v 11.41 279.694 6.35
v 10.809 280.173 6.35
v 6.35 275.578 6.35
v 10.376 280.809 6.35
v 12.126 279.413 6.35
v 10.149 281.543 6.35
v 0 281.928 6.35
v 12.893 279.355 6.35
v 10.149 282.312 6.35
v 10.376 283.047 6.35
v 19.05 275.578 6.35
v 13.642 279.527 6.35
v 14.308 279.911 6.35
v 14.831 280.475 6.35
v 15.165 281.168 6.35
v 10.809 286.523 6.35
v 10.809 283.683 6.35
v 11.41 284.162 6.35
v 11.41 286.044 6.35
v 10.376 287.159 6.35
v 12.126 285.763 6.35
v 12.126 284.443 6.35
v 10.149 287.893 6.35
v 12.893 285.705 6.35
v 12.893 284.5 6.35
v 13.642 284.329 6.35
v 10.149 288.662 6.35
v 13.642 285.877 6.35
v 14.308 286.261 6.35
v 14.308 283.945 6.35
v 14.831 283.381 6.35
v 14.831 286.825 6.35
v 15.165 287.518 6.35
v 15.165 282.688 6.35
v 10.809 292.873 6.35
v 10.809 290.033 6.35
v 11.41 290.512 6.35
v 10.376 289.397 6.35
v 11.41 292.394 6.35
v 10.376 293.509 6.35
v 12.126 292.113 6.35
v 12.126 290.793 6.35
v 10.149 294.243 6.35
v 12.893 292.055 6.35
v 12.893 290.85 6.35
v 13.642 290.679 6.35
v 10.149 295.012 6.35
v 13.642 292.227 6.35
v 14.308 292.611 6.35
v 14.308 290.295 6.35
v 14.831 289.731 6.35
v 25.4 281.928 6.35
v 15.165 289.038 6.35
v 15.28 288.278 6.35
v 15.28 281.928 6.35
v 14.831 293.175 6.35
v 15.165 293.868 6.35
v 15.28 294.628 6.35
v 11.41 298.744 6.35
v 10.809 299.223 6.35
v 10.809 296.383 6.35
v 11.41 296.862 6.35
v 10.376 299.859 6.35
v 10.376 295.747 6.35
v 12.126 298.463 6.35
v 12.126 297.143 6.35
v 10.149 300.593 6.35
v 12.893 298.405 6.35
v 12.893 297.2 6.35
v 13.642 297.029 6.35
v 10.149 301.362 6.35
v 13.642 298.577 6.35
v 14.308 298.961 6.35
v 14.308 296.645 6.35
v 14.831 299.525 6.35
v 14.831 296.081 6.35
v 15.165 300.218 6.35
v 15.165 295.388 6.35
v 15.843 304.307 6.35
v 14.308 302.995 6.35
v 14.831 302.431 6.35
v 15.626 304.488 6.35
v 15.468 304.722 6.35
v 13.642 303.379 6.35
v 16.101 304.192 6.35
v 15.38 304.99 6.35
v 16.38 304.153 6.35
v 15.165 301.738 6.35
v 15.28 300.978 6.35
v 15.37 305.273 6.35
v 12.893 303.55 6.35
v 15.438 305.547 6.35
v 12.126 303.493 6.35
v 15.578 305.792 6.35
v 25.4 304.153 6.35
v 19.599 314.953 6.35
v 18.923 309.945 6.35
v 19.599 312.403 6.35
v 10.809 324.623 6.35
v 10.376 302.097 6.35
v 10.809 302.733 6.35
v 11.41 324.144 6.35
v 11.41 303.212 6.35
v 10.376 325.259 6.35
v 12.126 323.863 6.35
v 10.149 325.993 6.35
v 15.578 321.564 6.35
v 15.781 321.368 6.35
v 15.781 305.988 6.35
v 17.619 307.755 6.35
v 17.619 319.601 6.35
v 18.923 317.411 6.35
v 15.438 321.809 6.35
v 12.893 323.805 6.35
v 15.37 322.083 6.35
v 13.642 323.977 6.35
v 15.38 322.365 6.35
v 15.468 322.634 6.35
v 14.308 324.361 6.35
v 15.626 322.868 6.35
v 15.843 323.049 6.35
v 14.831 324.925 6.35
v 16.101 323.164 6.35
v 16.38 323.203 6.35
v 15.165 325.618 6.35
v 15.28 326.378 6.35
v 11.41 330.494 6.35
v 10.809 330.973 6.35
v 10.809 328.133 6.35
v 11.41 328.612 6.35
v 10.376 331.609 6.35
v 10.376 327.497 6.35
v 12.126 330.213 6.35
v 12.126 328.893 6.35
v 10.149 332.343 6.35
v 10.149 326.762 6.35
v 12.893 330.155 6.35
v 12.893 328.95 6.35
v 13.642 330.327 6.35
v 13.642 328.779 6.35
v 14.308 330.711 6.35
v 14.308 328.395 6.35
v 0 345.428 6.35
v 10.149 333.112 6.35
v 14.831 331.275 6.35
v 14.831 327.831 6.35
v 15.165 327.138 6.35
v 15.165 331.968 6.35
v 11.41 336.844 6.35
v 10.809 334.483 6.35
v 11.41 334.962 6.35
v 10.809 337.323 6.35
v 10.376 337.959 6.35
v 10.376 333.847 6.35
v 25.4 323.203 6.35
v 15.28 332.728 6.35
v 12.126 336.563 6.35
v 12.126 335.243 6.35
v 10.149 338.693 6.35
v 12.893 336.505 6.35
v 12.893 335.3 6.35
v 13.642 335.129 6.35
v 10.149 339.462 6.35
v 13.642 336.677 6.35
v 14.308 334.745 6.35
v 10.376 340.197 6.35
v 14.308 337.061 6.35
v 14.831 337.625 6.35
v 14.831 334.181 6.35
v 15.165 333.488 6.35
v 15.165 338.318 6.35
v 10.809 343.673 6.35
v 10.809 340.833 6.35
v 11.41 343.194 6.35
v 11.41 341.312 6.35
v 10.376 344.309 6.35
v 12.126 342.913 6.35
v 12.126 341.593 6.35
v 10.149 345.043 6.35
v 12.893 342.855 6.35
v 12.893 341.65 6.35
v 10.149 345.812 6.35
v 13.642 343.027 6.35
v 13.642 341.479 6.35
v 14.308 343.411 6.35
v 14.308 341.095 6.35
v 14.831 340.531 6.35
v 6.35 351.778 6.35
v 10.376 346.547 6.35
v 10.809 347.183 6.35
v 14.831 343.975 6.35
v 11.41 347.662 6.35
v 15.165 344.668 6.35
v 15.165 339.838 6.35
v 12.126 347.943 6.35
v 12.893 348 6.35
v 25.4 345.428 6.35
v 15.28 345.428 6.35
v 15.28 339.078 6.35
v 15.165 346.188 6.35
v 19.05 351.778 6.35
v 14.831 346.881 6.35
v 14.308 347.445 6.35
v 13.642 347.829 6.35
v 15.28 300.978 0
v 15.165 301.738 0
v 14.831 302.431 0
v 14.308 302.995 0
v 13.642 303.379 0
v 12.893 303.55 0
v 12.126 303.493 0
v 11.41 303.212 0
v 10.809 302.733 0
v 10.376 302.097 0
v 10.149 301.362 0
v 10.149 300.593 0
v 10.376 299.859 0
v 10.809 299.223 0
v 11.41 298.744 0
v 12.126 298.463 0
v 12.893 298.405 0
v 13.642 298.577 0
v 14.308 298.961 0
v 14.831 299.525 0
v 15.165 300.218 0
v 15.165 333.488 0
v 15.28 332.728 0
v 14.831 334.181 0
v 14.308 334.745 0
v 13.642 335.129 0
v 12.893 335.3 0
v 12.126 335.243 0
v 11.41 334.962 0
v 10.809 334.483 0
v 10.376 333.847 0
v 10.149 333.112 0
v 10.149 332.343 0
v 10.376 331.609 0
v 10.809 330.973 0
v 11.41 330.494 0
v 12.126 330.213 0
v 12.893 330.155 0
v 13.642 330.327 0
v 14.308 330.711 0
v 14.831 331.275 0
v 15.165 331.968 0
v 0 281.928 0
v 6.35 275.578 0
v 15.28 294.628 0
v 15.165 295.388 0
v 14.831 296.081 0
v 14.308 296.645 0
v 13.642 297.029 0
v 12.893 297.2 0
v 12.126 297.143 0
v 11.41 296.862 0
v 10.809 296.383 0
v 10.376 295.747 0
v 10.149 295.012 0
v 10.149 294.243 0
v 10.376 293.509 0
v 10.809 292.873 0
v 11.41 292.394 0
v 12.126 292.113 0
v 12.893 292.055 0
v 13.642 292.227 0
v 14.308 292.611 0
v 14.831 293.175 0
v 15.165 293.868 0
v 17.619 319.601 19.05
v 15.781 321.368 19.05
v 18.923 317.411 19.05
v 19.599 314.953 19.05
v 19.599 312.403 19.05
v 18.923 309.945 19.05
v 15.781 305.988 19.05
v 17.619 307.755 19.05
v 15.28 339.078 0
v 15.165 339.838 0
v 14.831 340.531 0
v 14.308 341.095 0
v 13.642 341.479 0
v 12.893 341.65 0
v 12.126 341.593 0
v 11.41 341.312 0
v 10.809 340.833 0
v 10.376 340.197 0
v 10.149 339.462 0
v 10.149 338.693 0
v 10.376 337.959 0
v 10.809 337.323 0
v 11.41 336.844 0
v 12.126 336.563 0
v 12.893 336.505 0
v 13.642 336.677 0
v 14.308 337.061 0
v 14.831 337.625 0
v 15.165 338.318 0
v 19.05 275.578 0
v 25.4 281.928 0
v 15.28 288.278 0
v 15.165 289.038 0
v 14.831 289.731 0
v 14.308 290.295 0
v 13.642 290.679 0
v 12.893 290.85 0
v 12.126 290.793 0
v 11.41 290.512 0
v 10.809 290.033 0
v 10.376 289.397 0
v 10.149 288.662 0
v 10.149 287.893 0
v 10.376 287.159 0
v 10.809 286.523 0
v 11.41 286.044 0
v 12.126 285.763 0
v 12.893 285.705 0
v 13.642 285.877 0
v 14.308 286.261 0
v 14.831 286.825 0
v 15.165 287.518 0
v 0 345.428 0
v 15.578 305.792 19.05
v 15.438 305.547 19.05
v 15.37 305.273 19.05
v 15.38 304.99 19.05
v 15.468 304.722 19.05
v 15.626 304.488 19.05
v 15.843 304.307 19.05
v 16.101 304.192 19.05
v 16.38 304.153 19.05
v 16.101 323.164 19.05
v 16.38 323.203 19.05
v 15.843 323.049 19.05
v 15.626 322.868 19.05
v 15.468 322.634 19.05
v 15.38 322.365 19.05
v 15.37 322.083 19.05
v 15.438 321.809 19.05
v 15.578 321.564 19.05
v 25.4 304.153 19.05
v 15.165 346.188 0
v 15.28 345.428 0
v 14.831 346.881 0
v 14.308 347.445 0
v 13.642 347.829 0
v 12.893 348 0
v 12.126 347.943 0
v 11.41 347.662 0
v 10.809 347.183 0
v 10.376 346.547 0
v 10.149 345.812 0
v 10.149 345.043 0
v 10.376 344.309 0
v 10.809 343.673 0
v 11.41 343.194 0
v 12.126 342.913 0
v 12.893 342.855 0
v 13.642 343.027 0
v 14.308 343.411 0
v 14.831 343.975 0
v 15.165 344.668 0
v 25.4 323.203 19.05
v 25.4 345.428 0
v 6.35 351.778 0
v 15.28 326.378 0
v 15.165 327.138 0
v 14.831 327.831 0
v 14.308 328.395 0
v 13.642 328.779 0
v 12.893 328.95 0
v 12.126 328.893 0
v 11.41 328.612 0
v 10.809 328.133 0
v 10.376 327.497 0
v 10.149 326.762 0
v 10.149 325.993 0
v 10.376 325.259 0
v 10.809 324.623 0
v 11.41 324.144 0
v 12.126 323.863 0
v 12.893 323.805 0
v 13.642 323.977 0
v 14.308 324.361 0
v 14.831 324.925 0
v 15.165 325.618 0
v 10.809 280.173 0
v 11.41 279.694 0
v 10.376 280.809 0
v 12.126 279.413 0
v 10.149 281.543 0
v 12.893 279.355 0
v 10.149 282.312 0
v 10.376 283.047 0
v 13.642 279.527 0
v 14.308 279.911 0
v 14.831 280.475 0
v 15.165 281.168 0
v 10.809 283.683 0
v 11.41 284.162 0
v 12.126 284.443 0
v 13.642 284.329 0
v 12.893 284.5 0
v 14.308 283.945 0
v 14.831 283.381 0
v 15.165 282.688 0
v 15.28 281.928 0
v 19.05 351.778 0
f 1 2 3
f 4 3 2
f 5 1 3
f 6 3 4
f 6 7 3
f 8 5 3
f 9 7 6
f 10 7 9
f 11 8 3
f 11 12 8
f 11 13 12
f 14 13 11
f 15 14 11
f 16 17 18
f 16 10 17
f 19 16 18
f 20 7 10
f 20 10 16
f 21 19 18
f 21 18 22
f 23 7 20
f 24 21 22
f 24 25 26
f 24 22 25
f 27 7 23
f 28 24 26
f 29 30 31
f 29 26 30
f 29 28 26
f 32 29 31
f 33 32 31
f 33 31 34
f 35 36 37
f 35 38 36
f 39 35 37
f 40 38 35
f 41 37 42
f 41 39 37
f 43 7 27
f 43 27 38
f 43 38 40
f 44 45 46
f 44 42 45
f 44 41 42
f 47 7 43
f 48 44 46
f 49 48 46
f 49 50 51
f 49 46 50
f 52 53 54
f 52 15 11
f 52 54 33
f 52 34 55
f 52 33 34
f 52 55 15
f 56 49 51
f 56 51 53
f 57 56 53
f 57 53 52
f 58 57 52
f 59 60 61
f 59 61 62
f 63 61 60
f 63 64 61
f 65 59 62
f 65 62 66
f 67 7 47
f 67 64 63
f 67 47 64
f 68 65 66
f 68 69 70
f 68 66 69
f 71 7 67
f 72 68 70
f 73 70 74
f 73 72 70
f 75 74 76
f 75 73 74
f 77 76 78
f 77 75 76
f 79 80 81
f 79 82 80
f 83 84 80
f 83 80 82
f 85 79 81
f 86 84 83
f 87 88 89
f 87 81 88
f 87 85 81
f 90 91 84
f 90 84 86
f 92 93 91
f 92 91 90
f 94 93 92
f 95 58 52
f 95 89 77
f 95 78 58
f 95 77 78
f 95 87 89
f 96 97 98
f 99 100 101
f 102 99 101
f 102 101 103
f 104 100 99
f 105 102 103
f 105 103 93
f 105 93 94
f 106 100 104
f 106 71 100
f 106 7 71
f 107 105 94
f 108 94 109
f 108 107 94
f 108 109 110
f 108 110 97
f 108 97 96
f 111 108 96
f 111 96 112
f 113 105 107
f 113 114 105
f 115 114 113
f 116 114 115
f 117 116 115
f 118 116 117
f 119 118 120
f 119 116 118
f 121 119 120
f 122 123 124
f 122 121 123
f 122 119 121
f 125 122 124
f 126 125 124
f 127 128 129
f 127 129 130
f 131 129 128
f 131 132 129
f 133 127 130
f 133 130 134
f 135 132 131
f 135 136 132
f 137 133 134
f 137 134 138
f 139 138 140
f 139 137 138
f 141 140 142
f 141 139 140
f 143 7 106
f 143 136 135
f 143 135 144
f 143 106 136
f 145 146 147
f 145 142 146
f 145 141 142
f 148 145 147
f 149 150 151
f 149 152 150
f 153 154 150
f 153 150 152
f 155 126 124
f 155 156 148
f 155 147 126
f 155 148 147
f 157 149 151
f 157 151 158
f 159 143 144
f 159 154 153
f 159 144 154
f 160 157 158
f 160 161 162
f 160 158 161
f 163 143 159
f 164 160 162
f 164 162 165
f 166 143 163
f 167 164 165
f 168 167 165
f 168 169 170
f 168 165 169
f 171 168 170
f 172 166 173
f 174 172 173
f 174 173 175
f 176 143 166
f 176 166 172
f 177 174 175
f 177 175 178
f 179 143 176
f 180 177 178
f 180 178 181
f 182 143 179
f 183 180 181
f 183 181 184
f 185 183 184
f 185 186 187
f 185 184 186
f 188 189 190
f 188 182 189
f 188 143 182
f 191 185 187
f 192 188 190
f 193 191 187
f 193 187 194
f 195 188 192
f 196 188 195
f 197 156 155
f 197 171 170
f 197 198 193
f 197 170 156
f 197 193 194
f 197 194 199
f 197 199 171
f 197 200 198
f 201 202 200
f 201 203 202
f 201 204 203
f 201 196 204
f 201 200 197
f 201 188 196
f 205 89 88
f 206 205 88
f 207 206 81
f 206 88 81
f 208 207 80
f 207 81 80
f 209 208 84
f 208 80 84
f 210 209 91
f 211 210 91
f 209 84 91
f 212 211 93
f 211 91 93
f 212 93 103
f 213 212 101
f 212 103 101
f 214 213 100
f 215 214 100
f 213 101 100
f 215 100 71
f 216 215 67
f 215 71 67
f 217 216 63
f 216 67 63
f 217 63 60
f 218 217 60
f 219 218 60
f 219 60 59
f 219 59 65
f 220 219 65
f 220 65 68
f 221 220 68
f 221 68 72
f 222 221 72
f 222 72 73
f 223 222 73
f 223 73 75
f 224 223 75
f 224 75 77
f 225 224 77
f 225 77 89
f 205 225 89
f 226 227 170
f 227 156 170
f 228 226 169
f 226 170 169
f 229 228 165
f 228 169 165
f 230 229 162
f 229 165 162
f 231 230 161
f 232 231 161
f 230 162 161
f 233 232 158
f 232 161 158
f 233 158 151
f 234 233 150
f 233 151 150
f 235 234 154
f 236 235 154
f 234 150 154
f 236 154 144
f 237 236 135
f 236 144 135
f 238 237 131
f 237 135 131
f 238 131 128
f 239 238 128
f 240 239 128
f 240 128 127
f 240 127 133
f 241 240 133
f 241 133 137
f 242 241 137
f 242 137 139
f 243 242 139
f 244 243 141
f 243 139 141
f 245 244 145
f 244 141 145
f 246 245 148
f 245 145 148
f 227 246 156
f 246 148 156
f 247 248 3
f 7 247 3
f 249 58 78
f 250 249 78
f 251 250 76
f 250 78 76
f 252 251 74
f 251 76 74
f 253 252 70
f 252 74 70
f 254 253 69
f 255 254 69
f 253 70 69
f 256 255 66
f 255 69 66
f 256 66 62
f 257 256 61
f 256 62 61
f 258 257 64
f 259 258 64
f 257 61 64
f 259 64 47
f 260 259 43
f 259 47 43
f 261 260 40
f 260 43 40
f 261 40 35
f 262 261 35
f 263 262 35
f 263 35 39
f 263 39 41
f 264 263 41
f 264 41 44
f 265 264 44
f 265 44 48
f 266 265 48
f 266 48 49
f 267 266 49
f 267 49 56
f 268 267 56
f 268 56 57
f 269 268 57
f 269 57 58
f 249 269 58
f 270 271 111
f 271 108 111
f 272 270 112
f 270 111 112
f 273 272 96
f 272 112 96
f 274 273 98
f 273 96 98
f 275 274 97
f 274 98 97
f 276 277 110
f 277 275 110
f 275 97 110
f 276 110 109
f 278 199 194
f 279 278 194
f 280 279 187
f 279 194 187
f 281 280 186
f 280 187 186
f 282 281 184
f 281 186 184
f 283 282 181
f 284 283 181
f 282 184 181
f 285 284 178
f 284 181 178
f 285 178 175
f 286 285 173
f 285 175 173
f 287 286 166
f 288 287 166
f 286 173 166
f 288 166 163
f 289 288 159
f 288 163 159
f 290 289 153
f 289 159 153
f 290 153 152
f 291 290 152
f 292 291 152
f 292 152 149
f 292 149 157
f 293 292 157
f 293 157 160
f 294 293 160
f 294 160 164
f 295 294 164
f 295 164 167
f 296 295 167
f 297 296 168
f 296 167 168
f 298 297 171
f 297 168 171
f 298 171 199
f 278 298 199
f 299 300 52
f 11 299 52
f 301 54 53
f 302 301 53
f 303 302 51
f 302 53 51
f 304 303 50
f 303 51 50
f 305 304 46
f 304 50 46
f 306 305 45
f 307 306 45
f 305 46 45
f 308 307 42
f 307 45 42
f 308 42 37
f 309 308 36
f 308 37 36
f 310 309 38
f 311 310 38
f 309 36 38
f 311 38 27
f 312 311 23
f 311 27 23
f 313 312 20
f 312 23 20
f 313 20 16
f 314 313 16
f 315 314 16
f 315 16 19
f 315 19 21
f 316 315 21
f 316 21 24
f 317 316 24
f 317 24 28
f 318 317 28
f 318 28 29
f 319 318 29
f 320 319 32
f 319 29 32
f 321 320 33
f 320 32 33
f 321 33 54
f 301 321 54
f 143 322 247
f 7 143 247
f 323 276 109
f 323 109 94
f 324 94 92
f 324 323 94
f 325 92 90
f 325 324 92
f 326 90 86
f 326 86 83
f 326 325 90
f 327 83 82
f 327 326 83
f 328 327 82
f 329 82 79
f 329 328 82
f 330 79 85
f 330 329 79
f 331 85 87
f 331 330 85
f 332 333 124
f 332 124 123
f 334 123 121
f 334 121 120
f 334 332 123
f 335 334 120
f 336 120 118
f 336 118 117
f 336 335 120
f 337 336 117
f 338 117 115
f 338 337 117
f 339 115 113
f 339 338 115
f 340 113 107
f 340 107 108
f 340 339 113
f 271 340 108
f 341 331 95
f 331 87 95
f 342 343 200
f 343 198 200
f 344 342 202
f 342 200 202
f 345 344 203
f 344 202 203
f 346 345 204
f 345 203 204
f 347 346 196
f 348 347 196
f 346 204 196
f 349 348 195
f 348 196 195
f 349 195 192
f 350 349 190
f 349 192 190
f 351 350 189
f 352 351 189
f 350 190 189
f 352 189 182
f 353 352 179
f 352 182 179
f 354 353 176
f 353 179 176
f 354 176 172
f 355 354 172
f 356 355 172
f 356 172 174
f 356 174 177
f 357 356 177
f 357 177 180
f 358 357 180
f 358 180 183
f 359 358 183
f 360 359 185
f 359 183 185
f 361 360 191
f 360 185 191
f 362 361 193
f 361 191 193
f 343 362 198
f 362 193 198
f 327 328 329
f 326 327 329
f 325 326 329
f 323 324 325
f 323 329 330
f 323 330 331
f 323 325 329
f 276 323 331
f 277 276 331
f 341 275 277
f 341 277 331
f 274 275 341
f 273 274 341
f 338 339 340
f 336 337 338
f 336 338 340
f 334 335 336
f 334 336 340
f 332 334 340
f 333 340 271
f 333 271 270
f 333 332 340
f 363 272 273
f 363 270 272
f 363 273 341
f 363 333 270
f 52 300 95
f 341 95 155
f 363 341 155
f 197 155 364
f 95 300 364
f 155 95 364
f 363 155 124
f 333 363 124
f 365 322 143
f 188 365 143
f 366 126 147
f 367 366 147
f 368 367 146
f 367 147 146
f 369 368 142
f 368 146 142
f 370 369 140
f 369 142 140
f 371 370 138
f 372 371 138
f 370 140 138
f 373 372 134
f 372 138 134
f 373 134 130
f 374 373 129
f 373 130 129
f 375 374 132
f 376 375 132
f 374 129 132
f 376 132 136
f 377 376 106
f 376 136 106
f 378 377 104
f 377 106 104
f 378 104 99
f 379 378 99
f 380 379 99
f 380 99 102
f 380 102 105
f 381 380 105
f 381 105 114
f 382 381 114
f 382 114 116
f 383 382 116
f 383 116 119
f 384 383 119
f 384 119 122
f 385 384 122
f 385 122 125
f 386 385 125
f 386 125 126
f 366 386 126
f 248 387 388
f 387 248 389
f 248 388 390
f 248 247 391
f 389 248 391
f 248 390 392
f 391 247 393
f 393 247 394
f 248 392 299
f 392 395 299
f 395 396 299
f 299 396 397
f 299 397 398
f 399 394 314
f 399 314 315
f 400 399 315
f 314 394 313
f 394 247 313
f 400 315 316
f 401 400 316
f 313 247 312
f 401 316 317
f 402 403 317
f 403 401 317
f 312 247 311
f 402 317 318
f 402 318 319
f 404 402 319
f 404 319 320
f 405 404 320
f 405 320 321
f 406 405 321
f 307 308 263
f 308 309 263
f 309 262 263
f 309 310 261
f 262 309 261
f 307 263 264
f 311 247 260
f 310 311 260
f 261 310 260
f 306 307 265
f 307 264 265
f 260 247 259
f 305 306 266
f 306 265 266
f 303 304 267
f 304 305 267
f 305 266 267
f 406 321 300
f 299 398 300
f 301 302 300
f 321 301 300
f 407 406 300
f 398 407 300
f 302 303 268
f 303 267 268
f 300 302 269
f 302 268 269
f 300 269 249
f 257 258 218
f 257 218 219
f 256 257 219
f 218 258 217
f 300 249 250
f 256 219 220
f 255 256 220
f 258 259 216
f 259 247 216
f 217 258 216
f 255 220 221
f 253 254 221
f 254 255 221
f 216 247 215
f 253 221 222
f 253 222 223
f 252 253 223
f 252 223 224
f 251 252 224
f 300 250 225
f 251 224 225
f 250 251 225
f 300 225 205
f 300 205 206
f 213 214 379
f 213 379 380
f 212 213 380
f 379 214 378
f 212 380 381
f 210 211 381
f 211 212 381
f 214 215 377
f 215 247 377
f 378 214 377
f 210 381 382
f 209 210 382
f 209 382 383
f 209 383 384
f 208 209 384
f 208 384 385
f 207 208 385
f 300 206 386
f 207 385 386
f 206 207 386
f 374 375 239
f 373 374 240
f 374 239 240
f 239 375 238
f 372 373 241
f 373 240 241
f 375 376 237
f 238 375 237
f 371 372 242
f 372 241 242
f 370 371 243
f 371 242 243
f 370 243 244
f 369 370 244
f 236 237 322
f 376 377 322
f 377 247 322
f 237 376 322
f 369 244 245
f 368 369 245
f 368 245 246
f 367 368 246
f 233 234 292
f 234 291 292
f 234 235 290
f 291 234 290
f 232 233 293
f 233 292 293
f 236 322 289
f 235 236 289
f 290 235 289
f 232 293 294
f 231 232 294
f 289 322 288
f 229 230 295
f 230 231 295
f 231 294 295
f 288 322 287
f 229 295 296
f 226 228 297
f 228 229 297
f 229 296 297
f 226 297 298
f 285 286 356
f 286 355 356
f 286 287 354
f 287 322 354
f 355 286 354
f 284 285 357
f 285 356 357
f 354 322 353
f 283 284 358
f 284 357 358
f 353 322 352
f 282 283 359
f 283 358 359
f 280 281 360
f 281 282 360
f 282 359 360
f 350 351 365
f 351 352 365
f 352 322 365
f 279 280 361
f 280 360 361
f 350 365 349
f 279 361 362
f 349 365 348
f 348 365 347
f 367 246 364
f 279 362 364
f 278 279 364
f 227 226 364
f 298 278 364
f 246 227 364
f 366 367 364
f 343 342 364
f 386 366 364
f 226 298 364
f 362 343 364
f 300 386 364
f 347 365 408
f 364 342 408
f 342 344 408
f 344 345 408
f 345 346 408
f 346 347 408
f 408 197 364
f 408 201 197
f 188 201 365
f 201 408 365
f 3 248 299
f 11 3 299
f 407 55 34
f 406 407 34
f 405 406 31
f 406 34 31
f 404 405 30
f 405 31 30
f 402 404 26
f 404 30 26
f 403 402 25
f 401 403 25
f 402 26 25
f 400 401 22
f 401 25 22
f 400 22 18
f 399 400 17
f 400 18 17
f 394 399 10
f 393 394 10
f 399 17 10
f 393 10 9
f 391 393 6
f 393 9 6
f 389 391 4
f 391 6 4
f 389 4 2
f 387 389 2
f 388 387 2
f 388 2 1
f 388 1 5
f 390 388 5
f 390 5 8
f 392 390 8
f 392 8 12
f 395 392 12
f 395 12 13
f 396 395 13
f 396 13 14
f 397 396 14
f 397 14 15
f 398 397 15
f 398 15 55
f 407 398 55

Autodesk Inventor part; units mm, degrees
ref_plane "YZ Plane" through (0, 0, 0) normal (1, 0, 0) x (0, 1, 0)
ref_plane "XZ Plane" through (0, 0, 0) normal (0, 1, 0) x (-1, 0, 0)
ref_plane "XY Plane" through (0, 0, 0) normal (0, 0, 1) x (1, 0, 0)
sketch "Sketch1" plane through (0, 0, 0) normal (0, 0, 1) x (1, 0, 0)
  line L0 (0, 275.5779) -> (25.4, 275.5779)
  line L1 (25.4, 275.5779) -> (25.4, 351.7779)
  line L2 (25.4, 351.7779) -> (0, 351.7779)
  line L3 (0, 351.7779) -> (0, 275.5779)
  line L4 (0, 0) -> (0, 457.2) projected
  line L5 (25.4, 0) -> (25.4, 457.2) projected
  dimension "d0" = 76.2
  dimension "d1" = 25.4
extrude "Extrusion1" add sketch "Sketch1" along normal blind 6.35
sketch "Sketch2" plane through (0, 0, 6.35) normal (0, 0, 1) x (1, 0, 0)
  circle A0 centre (12.7, 281.9279) radius 2.5797
  line L0 (25.4, 275.5779) -> (25.4, 351.7779) projected
  line L1 (0, 275.5779) -> (25.4, 275.5779) projected
  circle A1 centre (12.7, 288.2779) radius 2.5797
  circle A2 centre (12.7, 294.6279) radius 2.5797
  circle A3 centre (12.7, 300.9779) radius 2.5797
  circle A4 centre (12.7, 326.3779) radius 2.5797
  circle A5 centre (12.7, 332.7279) radius 2.5797
  circle A6 centre (12.7, 339.0779) radius 2.5797
  circle A7 centre (12.7, 345.4279) radius 2.5797
  point P0 (0, 0)
  dimension "d4" = 12.7
  dimension "d5" = 6.35
  dimension "d6" = 5.1594
  dimension "d9" = 6.35
  dimension "d16" = 44.45
extrude "Extrusion2" cut sketch "Sketch2" against normal through all
sketch "Sketch3" plane through (0, 0, 6.35) normal (0, 0, 1) x (1, 0, 0)
  line L0 (10.16, 304.1529) -> (25.4, 304.1529)
  line L1 (25.4, 304.1529) -> (25.4, 323.2029)
  line L2 (25.4, 323.2029) -> (10.16, 323.2029)
  line L3 (10.16, 323.2029) -> (10.16, 304.1529)
  line L4 (25.4, 275.5779) -> (25.4, 351.7779) projected
  line L5 (25.4, 351.7779) -> (0, 351.7779) projected
  circle A0 centre (10.16, 313.6779) radius 9.525
  point P0 (0, 0)
  point P1 (10.16, 304.1529)
  point P2 (10.16, 323.2029)
  dimension "d23" = 15.24
  dimension "d24" = 28.575
  dimension "d25" = 19.05
extrude "Extrusion3" add sketch "Sketch3" along normal blind 12.7 contours A0 L2 L1 L0
fillet "Fillet1" radius 1.016 2 edges at (10.16, 304.1529, 12.7) (10.16, 323.2029, 12.7)
chamfer "Chamfer1" distance 6.35 angle 45 4 edges at (25.4, 351.7779, 3.175) (0, 351.7779, 3.175) (0, 275.5779, 3.175) (25.4, 275.5779, 3.175)
properties part number "ShaftRest"
